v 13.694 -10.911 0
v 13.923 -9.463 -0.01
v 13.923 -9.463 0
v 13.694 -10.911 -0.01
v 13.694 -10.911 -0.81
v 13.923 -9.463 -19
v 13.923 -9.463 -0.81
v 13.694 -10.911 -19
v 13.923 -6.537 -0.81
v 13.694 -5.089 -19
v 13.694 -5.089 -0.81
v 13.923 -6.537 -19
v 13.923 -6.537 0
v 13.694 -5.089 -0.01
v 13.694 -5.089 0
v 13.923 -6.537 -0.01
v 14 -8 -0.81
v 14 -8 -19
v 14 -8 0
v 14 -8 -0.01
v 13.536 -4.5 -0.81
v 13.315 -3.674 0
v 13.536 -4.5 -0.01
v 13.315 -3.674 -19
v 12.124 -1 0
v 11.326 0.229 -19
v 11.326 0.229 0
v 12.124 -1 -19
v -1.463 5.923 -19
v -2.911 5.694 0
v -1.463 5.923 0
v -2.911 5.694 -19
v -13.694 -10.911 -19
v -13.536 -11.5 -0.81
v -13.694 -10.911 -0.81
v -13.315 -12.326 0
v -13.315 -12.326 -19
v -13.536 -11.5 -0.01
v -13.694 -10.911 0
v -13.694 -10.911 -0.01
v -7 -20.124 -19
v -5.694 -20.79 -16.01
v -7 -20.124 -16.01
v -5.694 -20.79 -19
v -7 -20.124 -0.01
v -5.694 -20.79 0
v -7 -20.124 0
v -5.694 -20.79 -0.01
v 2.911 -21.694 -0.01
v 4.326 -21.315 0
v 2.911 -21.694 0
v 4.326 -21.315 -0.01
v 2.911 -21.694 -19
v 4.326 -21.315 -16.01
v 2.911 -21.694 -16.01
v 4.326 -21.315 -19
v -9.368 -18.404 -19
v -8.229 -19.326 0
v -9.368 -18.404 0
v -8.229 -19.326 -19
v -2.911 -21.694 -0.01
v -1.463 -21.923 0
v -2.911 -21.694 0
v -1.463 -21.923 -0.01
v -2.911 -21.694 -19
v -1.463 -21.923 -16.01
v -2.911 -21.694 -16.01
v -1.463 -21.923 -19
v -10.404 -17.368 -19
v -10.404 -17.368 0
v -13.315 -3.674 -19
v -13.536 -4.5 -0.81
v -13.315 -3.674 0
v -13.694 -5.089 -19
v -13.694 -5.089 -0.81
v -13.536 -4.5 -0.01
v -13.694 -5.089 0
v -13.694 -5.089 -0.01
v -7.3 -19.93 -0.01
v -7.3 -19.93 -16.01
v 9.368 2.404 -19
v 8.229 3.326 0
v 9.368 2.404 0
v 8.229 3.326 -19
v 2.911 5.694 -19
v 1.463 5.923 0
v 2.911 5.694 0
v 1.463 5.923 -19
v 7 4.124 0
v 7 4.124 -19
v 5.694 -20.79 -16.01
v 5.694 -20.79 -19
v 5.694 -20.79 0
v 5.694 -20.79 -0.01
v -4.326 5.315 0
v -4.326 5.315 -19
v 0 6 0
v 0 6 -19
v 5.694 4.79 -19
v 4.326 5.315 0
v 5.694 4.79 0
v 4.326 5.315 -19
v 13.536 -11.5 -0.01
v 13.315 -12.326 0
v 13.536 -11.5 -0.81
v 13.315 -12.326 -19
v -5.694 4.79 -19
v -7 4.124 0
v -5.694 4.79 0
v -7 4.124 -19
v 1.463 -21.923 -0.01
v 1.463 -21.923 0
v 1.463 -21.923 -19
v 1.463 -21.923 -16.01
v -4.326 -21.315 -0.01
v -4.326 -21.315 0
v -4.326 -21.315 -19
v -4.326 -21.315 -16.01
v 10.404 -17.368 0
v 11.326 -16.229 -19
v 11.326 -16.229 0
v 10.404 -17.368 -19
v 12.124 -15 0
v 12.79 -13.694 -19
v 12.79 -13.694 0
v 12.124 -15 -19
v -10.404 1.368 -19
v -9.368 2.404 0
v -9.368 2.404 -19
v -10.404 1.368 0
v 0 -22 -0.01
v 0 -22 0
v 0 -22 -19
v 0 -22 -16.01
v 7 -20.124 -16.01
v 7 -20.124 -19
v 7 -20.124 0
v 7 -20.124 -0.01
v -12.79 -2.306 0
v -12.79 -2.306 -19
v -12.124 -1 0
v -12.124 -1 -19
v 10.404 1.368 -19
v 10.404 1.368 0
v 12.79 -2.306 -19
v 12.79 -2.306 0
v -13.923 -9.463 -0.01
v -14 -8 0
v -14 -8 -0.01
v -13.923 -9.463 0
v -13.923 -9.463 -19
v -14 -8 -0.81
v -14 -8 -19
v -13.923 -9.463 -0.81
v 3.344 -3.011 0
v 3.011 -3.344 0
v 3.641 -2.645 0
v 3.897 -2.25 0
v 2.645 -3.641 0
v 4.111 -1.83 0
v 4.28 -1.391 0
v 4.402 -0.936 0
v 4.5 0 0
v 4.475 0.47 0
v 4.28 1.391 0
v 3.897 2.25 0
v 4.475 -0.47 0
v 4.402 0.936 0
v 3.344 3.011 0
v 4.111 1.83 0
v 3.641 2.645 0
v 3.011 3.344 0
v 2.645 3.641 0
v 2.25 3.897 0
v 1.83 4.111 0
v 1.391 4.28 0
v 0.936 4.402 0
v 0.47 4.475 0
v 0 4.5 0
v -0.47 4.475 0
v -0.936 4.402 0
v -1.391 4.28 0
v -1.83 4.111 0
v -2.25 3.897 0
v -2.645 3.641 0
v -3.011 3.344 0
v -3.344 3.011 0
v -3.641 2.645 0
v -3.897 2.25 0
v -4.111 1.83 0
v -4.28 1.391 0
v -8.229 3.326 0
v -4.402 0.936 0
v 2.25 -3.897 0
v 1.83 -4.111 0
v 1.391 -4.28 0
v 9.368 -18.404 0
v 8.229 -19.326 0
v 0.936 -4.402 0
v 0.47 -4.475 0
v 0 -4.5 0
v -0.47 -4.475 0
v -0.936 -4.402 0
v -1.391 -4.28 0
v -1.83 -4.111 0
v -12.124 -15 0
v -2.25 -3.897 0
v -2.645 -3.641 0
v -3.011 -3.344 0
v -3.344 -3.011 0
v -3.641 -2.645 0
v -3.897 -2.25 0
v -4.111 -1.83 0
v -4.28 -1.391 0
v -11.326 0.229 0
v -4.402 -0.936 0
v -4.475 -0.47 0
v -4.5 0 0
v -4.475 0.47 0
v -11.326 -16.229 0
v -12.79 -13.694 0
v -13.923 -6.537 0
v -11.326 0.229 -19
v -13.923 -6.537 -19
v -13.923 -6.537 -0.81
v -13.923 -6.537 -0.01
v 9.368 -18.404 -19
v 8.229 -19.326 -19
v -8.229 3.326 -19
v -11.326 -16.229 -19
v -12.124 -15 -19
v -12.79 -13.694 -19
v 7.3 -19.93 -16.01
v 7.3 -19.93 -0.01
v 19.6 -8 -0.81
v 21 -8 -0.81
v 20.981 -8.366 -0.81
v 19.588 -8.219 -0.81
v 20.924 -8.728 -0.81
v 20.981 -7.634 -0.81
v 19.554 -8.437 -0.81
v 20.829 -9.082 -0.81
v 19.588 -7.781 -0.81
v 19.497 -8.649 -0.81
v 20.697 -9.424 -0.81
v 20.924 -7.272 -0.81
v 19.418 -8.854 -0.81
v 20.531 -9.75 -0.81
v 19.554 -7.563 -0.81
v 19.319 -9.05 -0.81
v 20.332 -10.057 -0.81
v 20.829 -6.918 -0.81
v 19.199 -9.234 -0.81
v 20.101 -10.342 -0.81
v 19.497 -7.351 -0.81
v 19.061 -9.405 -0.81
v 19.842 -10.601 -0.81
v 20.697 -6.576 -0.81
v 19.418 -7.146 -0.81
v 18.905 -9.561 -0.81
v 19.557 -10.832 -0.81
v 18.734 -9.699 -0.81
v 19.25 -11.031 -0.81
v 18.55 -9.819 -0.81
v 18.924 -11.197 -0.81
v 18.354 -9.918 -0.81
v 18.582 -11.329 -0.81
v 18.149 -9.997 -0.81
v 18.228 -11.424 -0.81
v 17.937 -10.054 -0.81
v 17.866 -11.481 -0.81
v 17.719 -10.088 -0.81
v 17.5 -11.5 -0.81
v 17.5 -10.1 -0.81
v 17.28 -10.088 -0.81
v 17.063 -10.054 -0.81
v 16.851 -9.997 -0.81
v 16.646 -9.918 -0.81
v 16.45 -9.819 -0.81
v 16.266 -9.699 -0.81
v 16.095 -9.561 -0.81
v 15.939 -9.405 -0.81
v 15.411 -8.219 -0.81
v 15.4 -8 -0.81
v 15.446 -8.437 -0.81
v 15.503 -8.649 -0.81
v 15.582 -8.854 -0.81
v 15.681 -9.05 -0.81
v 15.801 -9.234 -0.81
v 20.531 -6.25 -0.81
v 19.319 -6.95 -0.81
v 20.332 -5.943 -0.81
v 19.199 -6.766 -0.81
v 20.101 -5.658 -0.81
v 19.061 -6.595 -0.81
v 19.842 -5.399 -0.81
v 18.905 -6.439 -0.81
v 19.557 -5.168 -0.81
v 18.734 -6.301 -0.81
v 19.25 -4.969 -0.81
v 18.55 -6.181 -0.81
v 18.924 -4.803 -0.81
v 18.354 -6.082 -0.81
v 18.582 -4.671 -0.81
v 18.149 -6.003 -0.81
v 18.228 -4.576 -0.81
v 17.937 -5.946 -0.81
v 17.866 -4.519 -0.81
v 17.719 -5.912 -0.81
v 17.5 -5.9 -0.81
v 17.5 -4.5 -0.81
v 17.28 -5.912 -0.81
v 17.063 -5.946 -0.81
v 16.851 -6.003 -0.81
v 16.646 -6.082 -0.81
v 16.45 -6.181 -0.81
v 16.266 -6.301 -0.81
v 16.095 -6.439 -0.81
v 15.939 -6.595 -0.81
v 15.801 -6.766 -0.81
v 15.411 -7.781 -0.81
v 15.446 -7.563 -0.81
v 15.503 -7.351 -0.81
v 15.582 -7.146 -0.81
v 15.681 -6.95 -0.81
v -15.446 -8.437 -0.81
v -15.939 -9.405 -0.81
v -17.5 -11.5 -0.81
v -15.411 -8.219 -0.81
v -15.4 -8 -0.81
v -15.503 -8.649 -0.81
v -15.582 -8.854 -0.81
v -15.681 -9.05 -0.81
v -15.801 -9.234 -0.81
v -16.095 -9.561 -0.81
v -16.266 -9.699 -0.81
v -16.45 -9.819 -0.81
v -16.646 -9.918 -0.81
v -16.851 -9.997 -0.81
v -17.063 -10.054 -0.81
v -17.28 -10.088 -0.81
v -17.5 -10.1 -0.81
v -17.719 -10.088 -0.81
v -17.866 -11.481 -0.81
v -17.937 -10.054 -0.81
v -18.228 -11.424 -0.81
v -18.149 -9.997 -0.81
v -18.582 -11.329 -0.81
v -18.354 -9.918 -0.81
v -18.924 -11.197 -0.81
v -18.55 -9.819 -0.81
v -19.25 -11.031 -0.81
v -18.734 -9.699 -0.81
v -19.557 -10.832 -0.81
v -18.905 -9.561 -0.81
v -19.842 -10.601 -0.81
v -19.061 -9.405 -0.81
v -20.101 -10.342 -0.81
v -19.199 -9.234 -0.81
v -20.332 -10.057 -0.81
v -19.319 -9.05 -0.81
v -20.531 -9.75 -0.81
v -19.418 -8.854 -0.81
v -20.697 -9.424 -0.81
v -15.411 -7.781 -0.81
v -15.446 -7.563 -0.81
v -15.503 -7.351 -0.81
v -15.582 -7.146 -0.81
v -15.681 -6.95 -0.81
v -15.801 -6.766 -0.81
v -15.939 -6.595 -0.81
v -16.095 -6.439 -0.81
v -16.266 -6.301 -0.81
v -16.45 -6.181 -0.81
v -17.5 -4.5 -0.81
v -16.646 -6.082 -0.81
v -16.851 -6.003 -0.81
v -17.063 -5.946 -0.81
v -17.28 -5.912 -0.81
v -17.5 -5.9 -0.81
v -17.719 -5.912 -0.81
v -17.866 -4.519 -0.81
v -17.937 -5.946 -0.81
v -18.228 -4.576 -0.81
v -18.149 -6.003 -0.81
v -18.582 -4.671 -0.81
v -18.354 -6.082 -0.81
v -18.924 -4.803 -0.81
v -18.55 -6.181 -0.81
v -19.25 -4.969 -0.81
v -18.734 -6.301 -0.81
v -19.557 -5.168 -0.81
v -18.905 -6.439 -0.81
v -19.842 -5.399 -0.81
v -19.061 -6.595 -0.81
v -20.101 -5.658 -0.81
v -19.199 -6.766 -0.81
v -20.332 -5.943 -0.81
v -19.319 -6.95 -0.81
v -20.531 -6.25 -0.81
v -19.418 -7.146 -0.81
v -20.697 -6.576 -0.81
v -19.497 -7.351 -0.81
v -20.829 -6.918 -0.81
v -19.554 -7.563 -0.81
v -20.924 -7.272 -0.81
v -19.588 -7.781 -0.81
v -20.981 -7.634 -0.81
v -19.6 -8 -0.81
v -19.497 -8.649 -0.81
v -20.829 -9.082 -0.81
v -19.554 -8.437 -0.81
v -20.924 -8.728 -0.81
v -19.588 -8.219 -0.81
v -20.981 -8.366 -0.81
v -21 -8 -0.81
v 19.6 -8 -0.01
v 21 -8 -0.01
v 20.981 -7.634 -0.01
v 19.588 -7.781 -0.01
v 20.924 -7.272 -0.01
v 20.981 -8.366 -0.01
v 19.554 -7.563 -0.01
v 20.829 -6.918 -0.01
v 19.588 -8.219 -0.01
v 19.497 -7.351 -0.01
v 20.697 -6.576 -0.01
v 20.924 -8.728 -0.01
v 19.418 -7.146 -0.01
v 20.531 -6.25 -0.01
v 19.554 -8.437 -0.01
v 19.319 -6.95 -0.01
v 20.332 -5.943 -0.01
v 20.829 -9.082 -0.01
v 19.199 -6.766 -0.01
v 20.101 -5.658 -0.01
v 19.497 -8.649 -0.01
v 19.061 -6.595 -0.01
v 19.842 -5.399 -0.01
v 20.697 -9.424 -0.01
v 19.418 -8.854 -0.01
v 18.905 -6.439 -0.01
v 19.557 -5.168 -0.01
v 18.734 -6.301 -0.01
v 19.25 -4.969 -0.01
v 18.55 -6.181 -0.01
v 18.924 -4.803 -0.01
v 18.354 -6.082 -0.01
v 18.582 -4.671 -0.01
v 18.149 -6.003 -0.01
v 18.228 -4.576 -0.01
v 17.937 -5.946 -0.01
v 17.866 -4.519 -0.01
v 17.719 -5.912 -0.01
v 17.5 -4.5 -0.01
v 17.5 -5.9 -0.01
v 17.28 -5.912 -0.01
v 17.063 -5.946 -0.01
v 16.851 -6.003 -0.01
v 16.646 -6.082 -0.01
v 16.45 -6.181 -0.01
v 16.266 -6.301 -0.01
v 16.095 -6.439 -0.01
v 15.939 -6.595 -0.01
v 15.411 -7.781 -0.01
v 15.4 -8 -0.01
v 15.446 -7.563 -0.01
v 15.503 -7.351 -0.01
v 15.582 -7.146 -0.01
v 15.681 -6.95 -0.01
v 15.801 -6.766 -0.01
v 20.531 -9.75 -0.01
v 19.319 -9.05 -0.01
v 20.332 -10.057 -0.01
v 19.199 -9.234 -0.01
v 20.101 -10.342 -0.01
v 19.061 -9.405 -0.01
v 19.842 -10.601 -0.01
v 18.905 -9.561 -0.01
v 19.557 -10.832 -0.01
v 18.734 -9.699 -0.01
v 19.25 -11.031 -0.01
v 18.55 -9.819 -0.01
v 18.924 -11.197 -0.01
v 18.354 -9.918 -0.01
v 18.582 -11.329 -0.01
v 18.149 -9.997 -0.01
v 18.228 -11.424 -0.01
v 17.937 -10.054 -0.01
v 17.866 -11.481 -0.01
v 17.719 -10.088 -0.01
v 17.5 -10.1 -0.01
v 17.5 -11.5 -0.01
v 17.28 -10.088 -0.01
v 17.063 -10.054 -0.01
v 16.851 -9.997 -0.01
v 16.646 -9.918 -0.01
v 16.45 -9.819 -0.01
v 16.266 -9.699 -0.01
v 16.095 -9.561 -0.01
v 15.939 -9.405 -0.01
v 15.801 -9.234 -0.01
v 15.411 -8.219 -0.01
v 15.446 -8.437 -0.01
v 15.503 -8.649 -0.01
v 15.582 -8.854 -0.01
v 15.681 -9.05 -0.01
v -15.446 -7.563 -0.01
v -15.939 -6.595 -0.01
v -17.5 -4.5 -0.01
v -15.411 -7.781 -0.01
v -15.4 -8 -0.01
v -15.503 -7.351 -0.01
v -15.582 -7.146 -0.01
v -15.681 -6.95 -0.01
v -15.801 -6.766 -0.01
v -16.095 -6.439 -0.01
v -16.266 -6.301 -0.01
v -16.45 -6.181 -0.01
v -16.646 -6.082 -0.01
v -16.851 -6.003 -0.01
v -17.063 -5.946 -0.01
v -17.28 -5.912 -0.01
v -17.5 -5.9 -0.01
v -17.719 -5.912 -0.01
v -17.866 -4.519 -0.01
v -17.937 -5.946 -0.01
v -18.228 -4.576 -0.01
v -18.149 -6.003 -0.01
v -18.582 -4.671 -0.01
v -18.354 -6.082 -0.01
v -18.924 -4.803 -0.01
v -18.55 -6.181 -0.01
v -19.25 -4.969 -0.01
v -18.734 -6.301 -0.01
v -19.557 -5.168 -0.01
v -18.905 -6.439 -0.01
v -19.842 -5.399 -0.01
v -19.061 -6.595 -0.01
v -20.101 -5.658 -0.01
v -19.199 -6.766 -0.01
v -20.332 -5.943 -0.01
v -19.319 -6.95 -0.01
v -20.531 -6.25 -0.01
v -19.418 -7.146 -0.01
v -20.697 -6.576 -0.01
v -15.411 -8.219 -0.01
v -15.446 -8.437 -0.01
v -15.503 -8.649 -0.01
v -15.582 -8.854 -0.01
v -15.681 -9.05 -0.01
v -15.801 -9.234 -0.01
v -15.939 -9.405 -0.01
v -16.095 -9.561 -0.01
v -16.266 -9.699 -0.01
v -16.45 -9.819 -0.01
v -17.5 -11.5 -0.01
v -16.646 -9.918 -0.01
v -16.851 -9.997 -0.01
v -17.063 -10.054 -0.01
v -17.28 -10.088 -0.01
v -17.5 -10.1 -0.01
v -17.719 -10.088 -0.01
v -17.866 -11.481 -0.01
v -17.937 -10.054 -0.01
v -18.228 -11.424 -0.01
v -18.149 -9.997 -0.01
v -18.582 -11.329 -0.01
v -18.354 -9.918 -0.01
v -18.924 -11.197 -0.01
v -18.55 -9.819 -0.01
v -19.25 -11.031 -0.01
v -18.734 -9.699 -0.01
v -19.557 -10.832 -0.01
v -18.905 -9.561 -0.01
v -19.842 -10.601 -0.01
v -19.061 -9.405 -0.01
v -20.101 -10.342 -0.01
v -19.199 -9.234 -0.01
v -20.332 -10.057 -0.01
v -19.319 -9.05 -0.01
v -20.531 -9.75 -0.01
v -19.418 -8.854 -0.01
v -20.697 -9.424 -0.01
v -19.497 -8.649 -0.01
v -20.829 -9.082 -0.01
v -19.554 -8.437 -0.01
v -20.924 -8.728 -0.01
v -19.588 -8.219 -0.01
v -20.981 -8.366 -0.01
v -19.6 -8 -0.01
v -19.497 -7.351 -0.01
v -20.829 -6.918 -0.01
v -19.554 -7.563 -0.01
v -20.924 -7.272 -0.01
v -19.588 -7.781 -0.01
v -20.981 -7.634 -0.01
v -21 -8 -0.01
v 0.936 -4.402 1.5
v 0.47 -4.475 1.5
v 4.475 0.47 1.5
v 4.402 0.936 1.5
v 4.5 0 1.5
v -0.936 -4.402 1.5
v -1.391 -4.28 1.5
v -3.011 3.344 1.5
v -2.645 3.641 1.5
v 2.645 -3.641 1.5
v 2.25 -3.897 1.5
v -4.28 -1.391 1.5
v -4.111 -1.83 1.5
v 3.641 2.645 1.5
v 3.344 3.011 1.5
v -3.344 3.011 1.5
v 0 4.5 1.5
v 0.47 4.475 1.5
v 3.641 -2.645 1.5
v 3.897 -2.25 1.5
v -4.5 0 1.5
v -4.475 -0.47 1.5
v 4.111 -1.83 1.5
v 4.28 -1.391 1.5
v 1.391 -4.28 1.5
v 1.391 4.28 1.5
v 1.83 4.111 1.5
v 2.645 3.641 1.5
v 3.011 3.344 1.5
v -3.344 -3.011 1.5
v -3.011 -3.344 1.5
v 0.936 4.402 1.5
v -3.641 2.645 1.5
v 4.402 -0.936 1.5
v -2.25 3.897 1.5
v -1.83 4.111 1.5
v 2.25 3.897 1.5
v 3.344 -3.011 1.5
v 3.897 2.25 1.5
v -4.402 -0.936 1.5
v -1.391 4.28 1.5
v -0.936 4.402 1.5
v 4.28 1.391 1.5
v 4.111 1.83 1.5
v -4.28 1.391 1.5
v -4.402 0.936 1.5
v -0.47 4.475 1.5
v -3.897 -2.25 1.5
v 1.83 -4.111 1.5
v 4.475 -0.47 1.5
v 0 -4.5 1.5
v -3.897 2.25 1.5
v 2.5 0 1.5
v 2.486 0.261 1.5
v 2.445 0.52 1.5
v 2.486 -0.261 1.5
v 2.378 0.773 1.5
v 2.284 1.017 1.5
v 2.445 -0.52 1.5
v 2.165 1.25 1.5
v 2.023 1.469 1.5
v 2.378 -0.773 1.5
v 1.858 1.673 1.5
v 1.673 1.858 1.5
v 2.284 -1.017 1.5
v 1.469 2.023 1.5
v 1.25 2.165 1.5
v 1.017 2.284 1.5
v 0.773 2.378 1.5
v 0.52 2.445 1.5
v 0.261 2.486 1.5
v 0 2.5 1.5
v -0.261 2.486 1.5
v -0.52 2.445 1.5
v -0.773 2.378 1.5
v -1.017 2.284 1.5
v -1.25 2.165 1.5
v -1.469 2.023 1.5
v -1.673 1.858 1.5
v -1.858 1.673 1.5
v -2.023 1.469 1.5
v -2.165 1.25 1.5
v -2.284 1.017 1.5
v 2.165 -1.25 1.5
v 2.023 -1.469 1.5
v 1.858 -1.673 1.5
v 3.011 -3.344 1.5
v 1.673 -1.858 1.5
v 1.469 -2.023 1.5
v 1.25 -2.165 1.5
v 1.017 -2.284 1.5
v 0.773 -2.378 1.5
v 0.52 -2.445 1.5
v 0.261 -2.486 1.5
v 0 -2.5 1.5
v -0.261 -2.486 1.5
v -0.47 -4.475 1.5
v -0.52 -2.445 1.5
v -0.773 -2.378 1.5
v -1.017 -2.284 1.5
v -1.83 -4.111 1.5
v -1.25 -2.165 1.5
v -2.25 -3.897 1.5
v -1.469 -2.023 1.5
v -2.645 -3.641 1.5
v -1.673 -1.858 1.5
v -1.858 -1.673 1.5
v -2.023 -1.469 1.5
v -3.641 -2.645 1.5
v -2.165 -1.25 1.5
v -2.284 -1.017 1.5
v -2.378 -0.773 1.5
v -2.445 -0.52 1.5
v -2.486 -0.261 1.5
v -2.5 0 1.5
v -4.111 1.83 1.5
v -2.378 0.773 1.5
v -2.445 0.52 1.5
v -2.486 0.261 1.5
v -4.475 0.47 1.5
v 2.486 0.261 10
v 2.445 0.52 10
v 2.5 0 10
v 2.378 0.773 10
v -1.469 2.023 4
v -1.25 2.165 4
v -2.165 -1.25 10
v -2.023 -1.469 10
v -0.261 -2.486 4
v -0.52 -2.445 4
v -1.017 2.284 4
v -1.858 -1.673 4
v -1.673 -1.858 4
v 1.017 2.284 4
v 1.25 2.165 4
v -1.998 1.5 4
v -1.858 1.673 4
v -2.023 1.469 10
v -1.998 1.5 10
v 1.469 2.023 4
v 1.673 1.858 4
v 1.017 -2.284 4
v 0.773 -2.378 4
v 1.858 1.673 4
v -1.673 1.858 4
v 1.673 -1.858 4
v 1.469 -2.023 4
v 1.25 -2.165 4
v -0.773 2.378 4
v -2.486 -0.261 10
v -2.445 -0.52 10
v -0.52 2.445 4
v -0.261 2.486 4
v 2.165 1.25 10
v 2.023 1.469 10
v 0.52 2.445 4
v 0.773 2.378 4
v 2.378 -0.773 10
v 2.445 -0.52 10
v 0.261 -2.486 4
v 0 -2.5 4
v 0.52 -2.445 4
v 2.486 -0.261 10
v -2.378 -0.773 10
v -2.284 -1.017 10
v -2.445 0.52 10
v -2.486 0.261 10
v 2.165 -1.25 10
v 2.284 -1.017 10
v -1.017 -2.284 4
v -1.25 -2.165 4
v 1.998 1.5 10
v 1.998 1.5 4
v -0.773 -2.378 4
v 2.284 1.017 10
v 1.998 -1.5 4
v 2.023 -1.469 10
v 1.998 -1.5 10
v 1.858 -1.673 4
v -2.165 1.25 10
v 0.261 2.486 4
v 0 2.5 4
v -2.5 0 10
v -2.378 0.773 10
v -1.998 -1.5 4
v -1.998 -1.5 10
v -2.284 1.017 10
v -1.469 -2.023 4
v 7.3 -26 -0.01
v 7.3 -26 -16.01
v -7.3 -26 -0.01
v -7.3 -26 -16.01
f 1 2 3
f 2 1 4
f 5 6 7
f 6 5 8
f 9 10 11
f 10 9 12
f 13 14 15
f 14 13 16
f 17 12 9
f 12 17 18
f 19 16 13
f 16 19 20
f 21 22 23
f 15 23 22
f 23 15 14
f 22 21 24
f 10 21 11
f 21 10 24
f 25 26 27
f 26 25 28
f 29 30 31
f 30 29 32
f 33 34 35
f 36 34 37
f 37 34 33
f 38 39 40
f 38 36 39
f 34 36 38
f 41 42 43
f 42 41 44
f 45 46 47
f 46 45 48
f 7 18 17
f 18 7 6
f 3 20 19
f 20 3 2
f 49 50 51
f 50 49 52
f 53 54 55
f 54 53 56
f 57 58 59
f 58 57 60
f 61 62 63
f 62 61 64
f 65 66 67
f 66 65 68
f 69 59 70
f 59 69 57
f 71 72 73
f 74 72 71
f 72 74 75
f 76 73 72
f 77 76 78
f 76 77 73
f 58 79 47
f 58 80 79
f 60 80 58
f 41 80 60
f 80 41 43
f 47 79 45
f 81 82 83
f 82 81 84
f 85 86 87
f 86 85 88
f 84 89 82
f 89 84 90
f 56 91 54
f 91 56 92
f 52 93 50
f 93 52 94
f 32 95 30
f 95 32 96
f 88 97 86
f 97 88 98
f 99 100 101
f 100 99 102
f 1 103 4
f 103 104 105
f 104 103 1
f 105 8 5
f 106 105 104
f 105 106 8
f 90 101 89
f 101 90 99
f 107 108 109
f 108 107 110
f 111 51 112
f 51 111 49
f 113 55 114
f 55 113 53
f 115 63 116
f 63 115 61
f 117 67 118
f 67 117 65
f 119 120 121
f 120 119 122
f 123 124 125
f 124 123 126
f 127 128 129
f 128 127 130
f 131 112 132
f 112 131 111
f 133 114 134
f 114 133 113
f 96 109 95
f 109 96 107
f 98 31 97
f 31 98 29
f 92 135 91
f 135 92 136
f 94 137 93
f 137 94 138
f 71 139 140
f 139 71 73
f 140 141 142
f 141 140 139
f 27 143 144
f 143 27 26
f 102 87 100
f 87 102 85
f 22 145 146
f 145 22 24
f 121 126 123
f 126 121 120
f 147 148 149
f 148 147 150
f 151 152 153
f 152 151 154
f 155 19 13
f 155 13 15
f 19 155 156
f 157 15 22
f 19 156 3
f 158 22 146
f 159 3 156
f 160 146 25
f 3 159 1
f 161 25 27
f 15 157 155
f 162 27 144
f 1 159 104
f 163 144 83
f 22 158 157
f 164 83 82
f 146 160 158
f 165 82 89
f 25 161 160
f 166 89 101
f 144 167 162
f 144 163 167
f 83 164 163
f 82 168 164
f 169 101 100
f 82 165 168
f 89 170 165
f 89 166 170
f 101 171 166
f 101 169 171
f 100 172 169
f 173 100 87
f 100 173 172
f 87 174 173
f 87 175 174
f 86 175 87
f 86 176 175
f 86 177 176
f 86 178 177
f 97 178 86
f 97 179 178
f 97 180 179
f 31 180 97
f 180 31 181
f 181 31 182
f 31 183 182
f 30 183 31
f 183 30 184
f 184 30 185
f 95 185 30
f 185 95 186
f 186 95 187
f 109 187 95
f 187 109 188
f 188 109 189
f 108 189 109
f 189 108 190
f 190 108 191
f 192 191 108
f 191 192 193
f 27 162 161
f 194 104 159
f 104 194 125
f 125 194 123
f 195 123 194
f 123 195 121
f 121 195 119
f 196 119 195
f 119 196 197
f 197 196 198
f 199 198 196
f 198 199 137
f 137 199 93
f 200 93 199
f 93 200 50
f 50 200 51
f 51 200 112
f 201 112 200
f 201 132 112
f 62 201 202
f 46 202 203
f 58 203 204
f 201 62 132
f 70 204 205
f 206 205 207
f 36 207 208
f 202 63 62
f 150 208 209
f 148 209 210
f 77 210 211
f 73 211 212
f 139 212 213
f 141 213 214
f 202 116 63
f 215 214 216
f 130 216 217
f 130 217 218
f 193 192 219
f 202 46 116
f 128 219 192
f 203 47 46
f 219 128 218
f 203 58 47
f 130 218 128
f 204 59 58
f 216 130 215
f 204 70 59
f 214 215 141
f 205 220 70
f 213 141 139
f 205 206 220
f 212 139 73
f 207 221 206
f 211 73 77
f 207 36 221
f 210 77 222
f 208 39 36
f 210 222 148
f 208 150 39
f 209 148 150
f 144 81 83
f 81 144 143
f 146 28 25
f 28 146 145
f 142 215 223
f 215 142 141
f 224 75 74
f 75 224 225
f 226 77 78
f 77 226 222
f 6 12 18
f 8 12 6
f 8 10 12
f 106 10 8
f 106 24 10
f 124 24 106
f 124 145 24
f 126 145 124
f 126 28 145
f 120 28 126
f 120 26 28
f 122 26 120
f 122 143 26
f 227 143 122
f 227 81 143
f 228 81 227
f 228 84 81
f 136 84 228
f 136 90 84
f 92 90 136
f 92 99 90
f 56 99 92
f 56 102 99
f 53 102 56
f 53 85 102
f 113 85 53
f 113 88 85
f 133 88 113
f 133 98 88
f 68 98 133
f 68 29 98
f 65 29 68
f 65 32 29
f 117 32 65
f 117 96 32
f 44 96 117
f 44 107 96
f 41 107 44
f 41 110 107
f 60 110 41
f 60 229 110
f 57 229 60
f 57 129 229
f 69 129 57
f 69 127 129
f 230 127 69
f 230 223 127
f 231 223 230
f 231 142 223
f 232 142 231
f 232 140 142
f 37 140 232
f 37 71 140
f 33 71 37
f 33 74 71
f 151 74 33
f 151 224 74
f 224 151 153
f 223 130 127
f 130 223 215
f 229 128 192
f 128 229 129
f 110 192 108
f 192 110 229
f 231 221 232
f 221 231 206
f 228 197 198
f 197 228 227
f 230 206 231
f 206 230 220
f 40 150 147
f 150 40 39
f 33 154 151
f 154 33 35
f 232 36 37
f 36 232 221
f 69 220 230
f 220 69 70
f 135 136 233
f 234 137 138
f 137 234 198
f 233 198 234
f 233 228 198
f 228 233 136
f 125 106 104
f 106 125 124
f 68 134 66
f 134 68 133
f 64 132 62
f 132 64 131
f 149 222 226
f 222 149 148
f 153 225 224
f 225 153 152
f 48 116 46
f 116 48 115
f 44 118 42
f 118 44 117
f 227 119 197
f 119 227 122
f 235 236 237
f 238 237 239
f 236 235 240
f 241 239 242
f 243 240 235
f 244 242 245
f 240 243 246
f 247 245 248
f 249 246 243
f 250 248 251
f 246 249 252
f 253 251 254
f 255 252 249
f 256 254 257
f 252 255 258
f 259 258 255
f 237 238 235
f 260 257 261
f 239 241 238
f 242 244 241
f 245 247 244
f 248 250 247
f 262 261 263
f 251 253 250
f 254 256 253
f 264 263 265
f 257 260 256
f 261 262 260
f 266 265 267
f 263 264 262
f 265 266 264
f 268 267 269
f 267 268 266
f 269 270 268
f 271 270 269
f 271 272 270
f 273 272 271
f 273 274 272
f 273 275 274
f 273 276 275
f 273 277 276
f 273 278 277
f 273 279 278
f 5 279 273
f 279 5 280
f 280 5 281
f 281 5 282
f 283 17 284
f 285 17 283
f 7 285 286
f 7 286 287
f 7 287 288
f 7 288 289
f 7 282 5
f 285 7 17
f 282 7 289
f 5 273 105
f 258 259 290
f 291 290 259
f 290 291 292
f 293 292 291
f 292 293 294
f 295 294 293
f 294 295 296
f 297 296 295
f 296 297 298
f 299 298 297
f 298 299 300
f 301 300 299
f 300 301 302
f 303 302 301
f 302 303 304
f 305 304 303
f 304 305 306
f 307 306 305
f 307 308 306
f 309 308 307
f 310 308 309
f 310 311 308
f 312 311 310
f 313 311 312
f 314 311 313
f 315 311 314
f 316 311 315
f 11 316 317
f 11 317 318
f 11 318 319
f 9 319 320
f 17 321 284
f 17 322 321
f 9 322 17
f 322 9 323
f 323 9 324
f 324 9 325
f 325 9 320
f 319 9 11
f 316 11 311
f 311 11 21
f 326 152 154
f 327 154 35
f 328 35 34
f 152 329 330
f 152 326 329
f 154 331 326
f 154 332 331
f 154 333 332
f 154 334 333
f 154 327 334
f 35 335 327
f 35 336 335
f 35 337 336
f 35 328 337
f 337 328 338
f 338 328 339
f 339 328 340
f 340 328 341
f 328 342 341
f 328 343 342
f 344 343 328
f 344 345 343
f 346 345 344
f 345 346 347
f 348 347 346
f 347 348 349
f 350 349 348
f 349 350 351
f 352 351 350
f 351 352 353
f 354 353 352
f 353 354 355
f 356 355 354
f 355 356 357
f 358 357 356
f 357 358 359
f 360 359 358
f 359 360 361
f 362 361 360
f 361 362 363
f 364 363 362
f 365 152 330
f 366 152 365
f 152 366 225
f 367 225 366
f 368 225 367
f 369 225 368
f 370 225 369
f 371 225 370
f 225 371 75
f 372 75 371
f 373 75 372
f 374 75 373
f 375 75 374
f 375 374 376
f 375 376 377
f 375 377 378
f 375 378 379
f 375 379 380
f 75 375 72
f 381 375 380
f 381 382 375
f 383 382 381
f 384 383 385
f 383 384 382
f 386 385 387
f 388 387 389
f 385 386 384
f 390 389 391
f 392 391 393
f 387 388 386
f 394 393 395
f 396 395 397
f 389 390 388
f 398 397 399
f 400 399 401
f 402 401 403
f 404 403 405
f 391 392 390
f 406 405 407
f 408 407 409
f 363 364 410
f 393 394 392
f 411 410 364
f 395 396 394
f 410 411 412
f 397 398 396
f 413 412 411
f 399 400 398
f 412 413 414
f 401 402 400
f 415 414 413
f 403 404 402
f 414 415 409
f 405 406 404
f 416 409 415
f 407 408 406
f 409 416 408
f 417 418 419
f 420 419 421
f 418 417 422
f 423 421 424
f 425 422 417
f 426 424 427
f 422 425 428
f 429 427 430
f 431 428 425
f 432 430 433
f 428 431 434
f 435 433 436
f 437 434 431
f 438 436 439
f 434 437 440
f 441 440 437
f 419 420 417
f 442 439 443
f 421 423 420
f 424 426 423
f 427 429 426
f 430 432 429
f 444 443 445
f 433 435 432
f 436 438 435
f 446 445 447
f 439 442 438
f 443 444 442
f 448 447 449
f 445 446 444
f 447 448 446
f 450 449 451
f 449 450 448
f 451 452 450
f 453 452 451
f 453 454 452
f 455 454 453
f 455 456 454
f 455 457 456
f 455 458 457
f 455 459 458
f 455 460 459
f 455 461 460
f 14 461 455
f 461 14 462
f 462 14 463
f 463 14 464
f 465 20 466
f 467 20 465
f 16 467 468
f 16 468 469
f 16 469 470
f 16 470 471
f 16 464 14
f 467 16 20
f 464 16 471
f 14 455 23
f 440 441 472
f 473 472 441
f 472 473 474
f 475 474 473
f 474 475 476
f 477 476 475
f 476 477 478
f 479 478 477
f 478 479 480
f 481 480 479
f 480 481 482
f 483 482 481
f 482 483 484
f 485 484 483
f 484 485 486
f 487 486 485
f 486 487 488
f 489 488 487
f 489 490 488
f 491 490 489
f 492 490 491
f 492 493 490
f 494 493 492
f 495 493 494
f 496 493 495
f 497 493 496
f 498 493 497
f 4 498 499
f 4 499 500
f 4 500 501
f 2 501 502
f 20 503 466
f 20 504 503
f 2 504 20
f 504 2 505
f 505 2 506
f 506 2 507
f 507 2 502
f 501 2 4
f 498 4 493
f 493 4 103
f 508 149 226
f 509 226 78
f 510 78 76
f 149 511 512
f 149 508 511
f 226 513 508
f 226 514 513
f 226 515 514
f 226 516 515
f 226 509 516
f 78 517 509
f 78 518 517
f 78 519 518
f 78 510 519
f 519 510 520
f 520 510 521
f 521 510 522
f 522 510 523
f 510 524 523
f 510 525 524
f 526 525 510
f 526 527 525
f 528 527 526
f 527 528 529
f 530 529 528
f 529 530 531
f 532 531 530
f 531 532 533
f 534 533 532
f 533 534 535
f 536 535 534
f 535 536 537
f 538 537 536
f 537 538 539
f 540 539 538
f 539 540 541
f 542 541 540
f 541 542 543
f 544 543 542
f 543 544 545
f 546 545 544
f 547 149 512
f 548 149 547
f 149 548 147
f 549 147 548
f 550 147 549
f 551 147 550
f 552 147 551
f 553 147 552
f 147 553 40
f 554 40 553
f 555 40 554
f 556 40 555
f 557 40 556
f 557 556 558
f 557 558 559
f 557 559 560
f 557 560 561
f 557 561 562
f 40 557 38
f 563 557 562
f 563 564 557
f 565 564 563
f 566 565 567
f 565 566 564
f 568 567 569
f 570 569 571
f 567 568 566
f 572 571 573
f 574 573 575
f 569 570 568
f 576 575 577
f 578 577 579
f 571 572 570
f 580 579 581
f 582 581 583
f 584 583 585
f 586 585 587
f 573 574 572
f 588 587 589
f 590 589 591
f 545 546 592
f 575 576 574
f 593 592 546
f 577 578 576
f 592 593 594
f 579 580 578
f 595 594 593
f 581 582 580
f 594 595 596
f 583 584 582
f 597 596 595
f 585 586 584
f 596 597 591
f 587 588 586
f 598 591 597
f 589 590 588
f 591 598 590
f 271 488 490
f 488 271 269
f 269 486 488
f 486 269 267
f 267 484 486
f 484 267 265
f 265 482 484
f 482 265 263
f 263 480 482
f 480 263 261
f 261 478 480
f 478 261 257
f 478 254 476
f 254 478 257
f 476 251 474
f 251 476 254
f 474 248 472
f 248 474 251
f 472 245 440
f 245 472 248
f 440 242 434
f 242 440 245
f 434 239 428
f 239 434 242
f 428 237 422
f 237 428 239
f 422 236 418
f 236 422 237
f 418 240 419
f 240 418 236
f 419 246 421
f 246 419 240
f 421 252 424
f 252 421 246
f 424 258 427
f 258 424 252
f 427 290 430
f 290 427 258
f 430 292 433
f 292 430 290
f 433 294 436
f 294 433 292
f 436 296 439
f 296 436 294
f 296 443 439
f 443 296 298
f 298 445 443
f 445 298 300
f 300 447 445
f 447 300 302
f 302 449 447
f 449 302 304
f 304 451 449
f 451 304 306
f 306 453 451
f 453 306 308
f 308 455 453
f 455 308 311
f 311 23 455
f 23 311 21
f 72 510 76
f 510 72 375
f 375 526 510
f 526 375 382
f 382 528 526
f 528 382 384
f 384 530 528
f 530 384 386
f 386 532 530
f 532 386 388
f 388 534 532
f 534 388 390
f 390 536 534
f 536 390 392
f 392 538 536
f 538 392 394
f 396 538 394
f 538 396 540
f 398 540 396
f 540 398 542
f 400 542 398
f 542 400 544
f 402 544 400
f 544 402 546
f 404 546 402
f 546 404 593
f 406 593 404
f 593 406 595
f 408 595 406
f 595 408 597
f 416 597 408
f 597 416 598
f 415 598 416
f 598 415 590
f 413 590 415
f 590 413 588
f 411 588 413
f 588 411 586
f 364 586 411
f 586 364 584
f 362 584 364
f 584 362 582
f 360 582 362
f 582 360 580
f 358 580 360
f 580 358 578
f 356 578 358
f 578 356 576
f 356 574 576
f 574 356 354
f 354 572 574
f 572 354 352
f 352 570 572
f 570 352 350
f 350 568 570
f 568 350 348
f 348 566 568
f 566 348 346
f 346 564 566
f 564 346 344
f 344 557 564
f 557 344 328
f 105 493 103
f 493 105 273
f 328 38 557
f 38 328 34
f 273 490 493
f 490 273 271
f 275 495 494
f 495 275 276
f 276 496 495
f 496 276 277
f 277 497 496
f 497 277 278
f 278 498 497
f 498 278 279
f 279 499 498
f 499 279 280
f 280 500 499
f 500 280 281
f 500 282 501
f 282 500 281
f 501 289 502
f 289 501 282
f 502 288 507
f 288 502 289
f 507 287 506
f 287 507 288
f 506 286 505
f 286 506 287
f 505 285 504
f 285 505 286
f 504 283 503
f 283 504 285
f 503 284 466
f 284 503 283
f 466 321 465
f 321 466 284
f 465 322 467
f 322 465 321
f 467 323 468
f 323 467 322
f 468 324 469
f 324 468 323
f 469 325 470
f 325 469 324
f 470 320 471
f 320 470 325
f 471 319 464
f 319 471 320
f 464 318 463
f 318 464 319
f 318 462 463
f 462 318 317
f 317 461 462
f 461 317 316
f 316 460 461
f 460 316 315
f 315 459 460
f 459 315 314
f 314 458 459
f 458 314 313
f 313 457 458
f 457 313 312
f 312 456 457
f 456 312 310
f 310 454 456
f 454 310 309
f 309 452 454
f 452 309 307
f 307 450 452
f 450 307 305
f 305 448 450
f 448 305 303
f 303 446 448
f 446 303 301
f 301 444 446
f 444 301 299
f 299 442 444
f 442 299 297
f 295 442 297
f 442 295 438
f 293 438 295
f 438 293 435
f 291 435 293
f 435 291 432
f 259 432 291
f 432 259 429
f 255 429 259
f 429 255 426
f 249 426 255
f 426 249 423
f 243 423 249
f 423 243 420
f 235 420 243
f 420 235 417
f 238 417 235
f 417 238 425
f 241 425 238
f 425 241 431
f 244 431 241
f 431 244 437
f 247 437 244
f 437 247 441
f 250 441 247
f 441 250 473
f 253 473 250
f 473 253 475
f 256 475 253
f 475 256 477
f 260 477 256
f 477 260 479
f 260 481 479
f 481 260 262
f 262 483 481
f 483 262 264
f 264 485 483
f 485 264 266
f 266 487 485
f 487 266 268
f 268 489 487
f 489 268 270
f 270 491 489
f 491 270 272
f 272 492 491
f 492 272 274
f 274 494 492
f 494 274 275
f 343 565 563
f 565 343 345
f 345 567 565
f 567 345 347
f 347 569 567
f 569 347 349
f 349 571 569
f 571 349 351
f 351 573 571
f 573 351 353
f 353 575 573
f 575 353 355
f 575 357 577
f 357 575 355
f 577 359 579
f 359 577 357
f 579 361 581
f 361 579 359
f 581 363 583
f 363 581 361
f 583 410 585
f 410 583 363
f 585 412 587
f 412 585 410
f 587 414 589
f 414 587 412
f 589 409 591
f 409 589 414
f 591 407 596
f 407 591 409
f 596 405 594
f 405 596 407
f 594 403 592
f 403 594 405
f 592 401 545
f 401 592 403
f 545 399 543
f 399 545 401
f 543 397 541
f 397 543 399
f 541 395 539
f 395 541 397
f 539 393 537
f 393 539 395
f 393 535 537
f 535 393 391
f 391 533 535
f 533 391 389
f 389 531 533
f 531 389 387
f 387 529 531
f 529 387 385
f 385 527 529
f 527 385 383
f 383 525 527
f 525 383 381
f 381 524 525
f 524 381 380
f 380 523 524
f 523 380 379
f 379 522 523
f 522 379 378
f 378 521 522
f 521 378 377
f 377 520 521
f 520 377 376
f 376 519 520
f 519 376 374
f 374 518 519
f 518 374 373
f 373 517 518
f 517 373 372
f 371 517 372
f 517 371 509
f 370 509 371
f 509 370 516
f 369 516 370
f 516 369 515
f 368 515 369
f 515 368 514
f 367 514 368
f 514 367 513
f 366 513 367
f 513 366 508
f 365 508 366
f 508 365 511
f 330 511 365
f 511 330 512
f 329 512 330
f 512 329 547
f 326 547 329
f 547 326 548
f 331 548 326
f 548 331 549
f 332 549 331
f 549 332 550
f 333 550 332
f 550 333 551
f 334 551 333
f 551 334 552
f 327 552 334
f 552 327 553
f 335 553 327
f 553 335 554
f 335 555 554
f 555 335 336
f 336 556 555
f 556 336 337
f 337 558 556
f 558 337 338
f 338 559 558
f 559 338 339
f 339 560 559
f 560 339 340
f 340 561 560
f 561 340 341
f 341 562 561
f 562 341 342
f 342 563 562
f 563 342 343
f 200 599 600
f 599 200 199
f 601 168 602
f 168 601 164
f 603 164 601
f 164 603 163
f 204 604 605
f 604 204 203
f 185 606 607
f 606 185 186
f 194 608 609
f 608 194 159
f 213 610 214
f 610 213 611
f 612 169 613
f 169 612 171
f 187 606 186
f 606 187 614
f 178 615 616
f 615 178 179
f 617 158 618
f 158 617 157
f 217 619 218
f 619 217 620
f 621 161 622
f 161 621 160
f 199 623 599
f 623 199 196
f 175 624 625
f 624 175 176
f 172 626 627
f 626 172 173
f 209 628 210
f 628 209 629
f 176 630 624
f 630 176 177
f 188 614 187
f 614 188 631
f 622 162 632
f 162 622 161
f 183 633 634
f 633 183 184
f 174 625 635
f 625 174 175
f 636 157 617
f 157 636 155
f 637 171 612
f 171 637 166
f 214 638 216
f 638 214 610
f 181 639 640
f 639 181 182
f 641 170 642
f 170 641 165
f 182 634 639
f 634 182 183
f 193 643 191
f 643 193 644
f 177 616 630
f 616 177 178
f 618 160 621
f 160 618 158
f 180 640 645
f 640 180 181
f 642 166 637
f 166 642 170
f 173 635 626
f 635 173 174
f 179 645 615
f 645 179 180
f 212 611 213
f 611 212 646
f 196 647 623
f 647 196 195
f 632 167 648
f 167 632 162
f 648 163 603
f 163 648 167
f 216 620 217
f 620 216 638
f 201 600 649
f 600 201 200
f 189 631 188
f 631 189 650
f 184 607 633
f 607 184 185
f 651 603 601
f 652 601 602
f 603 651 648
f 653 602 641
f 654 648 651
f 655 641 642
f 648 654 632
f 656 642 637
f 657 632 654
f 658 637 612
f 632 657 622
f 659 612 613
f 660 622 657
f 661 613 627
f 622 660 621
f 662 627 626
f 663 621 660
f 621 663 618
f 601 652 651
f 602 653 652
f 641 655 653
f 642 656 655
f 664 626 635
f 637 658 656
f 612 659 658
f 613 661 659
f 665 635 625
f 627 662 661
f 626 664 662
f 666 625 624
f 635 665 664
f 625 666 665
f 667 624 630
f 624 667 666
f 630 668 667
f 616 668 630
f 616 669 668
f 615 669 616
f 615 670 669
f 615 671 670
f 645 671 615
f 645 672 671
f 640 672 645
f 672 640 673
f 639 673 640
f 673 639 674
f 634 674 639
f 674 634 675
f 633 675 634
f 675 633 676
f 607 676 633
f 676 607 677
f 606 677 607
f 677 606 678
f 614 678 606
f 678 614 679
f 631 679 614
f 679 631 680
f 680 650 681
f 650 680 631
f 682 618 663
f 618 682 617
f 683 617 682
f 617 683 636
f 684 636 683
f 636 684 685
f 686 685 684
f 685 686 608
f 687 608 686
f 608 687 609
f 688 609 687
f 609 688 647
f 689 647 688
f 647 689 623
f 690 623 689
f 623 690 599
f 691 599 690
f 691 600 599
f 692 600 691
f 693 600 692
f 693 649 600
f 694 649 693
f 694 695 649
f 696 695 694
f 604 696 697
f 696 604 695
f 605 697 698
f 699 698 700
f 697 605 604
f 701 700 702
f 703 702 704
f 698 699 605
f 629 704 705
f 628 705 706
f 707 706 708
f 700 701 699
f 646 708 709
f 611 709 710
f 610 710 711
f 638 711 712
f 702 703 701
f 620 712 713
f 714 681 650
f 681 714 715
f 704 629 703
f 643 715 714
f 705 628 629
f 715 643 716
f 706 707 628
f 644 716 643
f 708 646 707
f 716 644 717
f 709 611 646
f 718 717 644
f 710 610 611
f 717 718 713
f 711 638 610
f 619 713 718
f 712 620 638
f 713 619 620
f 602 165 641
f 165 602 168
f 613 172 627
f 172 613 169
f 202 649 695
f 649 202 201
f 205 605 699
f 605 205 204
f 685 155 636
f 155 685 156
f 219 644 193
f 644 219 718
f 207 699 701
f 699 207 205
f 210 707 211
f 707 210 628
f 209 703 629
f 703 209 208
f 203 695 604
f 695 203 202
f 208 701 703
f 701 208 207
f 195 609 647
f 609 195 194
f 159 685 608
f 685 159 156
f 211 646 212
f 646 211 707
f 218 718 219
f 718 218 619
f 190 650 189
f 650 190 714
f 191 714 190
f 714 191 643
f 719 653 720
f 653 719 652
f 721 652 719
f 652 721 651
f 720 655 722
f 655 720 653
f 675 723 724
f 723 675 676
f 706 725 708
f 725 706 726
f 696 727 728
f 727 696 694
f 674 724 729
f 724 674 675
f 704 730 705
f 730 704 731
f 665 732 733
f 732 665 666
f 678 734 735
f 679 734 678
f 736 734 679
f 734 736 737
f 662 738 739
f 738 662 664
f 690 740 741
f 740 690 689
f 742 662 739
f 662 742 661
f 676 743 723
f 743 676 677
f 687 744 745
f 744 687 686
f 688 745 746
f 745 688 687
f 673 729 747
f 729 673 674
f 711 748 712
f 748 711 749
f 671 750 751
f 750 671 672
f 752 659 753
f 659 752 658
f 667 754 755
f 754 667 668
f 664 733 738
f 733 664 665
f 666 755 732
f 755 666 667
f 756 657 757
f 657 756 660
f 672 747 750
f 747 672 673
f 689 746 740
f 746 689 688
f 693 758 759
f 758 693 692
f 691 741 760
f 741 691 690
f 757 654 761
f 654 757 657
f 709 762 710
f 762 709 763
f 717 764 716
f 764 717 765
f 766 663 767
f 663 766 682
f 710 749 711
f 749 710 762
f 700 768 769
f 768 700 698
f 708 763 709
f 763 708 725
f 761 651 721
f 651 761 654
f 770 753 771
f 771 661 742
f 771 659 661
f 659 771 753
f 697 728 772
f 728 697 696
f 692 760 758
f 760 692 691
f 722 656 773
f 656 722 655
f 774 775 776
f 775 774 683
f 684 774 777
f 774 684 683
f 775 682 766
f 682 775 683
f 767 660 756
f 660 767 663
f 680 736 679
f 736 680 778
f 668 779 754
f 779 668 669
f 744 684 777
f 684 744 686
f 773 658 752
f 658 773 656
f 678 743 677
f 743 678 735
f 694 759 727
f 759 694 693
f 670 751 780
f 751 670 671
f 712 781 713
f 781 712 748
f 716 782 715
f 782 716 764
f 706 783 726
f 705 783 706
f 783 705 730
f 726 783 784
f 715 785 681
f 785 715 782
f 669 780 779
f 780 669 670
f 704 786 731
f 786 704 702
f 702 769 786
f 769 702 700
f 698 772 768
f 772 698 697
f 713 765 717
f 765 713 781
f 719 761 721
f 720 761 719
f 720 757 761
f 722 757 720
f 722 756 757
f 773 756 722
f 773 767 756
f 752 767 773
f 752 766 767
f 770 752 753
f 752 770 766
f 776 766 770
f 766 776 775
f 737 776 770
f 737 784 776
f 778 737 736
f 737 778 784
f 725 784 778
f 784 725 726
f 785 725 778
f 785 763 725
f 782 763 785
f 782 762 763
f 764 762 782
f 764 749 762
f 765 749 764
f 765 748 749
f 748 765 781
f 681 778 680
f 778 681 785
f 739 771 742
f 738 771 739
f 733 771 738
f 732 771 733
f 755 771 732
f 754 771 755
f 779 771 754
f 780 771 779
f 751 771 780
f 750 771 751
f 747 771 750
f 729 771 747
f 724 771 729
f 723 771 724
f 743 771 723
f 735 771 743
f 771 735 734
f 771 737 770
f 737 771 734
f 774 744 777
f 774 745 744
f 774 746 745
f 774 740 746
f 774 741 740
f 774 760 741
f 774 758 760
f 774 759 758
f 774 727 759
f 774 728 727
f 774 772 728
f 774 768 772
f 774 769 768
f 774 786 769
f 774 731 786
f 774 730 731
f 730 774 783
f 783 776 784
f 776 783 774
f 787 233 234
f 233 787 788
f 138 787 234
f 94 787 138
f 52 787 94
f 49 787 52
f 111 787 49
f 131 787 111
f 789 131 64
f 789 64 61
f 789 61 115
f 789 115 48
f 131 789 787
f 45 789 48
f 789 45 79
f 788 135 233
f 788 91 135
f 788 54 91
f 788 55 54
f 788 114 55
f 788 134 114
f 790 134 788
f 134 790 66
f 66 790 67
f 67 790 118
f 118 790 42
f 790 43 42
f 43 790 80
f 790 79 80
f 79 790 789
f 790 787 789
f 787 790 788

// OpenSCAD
/*
   Copyright 2015-2018 Scott Bezek and the splitflap contributors

   Licensed under the Apache License, Version 2.0 (the "License");
   you may not use this file except in compliance with the License.
   You may obtain a copy of the License at

       http://www.apache.org/licenses/LICENSE-2.0

   Unless required by applicable law or agreed to in writing, software
   distributed under the License is distributed on an "AS IS" BASIS,
   WITHOUT WARRANTIES OR CONDITIONS OF ANY KIND, either express or implied.
   See the License for the specific language governing permissions and
   limitations under the License.
*/

28byj48_chassis_radius = 28/2;
28byj48_chassis_height = 19;
28byj48_shaft_offset = 8;
28byj48_mount_outer_radius = 3.5;
28byj48_mount_hole_radius = 4.2/2;
28byj48_mount_center_offset = 35/2;
28byj48_mount_bracket_height = 0.8;

28byj48_shaft_collar_radius = 9/2;
28byj48_shaft_collar_height = 1.5;

28byj48_shaft_radius = 5/2;
28byj48_shaft_height = 10;
28byj48_shaft_slotted_width = 3;
28byj48_shaft_slotted_height = 6;

28byj48_backpack_width = 14.6;
28byj48_backpack_extent = 18; // seen values from 17-18
28byj48_backpack_height = 16;

// Exports for use in other files:
function 28byj48_mount_bracket_height() = 28byj48_mount_bracket_height;
function 28byj48_shaft_radius() = 28byj48_shaft_radius;
function 28byj48_mount_center_offset() = 28byj48_mount_center_offset;
function 28byj48_chassis_radius() = 28byj48_chassis_radius;
function 28byj48_shaft_offset() = 28byj48_shaft_offset;
function 28byj48_chassis_height() = 28byj48_chassis_height;
function 28byj48_backpack_extent() = 28byj48_backpack_extent;

// Basic 28BYJ-48 model based on various dimensioned drawings.
// Origin is centered on the shaft, on the front face of the motor, with the shaft in the +z direction
module Stepper28BYJ48() {
    $fn = 60;

    eps = 0.01;

    gray = [0.7, 0.7, 0.7];
    gold = [1, 0.843, 0];
    blue = [0, 0, 1];

    module mounting_holes() {
        linear_extrude(height=28byj48_mount_bracket_height) {
        difference() {
            hull() {
                translate([28byj48_mount_center_offset, 0]) {
                    circle(r=28byj48_mount_outer_radius);
                }
                translate([-28byj48_mount_center_offset, 0]) {
                    circle(r=28byj48_mount_outer_radius);
                }
            }

            translate([28byj48_mount_center_offset, 0]) {
                circle(r=28byj48_mount_hole_radius);
            }
            translate([-28byj48_mount_center_offset, 0]) {
                circle(r=28byj48_mount_hole_radius);
            }
        }
        }
    }

    module shaft_collar() {
        cylinder(r=28byj48_shaft_collar_radius, h=28byj48_shaft_collar_height + eps);
    }

    module shaft() {
         color_extractor(gold) {
            difference() {
                cylinder(r=28byj48_shaft_radius, h=28byj48_shaft_height);
                translate([-(28byj48_shaft_radius + eps), 28byj48_shaft_slotted_width / 2, 28byj48_shaft_height - 28byj48_shaft_slotted_height]) {
                    cube([(28byj48_shaft_radius+eps)*2, 28byj48_shaft_radius, 28byj48_shaft_slotted_height+eps]);
                }
                translate([-(28byj48_shaft_radius + eps), - 28byj48_shaft_radius - (28byj48_shaft_slotted_width / 2), 28byj48_shaft_height - 28byj48_shaft_slotted_height]) {
                    cube([(28byj48_shaft_radius+eps)*2, 28byj48_shaft_radius, 28byj48_shaft_slotted_height+eps]);
                }
            }
        }
    }

    module chassis() {
         color_extractor(gray) {
            translate([0, 0, -28byj48_chassis_height]) {
                cylinder(r=28byj48_chassis_radius, h=28byj48_chassis_height);
            }
            translate([0, 0, -28byj48_mount_bracket_height - eps]) {
                mounting_holes();
            }
            translate([0, 28byj48_shaft_offset, -eps]) {
                shaft_collar();
            }
        }
    }

    module backpack() {
         color_extractor(blue) {
            translate([-28byj48_backpack_width/2, 0, -28byj48_backpack_height - eps]) {
                cube([28byj48_backpack_width, 28byj48_backpack_extent, 28byj48_backpack_height]);
            }
        }
    }

    translate([0, -28byj48_shaft_offset, 0]) {
        chassis();
        translate([0, 28byj48_shaft_offset, 0]) {
            shaft();
        }
        translate([0, -28byj48_backpack_extent, 0]) {
            backpack();
        }
    }
}

// Example usage:
Stepper28BYJ48();

module color_extractor(c) {
    echo(extracted_color=c);
    children();
}
